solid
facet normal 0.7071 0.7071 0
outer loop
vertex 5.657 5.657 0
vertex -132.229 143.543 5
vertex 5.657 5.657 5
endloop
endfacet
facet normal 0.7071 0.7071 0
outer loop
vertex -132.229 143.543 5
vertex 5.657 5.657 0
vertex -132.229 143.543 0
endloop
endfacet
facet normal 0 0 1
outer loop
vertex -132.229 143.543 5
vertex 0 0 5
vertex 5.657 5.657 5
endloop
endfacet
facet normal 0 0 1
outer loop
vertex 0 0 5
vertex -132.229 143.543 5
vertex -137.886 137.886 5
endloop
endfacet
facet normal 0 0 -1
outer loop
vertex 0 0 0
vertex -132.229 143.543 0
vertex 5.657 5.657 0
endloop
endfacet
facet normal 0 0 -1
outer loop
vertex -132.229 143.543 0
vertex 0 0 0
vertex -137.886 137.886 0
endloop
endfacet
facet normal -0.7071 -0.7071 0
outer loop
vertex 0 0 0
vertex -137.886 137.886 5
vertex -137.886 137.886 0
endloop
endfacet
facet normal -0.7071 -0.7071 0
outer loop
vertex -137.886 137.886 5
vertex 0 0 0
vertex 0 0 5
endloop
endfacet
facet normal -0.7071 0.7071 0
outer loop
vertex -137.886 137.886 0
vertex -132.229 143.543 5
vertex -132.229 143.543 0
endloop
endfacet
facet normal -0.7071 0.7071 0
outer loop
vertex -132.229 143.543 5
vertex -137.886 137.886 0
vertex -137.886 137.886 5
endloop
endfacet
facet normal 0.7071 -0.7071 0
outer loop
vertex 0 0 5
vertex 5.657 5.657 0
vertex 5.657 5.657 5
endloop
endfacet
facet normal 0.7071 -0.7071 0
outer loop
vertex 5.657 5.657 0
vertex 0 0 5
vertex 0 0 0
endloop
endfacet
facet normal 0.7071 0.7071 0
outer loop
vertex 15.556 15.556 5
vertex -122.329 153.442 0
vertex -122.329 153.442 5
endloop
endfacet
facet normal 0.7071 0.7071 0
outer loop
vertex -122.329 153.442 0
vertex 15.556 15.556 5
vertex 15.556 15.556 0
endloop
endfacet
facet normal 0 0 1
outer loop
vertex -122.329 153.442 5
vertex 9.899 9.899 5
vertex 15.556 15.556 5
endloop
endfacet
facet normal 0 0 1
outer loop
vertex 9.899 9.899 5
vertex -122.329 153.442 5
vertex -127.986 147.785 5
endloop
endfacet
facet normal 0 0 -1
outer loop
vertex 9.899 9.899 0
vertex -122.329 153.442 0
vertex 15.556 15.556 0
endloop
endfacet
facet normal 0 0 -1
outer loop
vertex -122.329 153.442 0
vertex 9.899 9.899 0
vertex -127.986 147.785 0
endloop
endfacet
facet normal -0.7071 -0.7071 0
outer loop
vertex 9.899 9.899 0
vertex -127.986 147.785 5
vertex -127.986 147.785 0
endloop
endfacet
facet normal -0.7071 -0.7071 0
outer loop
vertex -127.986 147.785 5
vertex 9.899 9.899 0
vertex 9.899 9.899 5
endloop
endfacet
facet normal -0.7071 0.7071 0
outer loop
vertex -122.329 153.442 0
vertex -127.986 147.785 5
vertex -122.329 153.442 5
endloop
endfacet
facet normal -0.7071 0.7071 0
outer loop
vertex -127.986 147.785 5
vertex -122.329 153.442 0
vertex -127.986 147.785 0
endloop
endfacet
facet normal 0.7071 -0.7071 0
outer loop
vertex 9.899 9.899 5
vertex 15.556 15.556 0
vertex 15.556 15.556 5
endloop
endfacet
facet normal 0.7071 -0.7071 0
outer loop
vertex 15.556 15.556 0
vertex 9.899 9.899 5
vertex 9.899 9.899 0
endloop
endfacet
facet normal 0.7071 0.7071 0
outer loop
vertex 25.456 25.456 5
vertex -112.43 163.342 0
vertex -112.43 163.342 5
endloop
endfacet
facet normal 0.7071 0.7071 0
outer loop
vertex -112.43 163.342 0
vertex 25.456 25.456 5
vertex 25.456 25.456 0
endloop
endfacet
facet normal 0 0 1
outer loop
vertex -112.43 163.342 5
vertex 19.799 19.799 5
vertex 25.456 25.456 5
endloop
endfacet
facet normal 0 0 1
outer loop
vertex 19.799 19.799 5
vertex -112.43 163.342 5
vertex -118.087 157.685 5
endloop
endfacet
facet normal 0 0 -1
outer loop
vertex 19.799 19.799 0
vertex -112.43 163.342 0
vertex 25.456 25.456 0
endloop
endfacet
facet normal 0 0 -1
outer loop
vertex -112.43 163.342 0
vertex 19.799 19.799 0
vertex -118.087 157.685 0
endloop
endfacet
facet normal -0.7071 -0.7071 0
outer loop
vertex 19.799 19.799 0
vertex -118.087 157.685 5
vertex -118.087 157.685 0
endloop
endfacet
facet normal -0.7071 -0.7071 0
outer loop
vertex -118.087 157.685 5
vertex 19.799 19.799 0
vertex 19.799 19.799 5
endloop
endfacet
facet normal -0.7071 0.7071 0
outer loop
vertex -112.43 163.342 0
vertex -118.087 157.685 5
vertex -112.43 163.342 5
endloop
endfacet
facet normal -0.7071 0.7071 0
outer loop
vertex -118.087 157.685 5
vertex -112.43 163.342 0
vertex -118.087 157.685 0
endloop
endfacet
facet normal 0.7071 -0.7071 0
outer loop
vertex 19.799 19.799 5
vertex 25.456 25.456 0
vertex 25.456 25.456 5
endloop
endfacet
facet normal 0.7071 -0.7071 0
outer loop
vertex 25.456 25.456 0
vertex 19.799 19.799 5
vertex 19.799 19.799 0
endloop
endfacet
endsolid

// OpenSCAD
// file: shapes.scad
// Shapes the fit test and the real parts share, so the parts get what the
// test print measured.
include <params.scad>

// Centered on x = 0. The outer face is y = 0 and the pocket opens through it;
// the stop runs from y = pocket to pocket + stop, with the wire slit through
// it. Open at the top.
module slot_void(width) {
    translate([-width / 2, -1, comb_base])
        cube([width, pocket + 1, comb_height - comb_base + 1]);
    translate([-wire_slit / 2, pocket - 1, comb_base])
        cube([wire_slit, stop + 2, comb_height - comb_base + 1]);
}

module label_text(t, size = 3) {
    linear_extrude(label_depth + 0.01)
        text(t, size = size, font = label_font,
             halign = "center", valign = "center");
}

module pin() {
    chamfer = 0.4;
    cylinder(d = stack_pin, h = stack_pin_height - chamfer, $fn = 64);
    translate([0, 0, stack_pin_height - chamfer])
        cylinder(d1 = stack_pin, d2 = stack_pin - 2 * chamfer, h = chamfer, $fn = 64);
}

// gap is a wire's measured gap between housings. Seated in both sockets, the
// rail puts the stops' pocket faces gap - gap_slack apart.
function rail_length(gap) = gap - gap_slack - 2 * stop + 2 * rail_socket_depth;

module rail(gap) {
    cube([rail_width, rail_length(gap), rail_height]);
}
// file: params.scad
// Every part includes this file. All lengths in mm, clearances per side.

// A 40-pin ribbon is 4 runs of 10 colors; a slot stacks 8, room for two kits.
housing = 2.54;
wires_per_slot = 8;
colors = 10;

// Fit test: the narrowest slot held flat, a stub took the 0.15 rail socket,
// the pin the 0.3 stack socket, and 3 mm digits read better than 2.5.
slot_width = 2.7;
rail_clearance = 0.15;
stack_clearance = 0.3;
digit_size = 3;

// Between a new wire's housings: 7 1/4 in measured on a 20 cm, 10 cm a guess.
wire_gap_10 = 84;
wire_gap_20 = 184;
// Bent wires come up short; a new one's housings sit out of their pockets.
gap_slack = 5;

slot_wall = 1.6;
// Clears 24 AWG insulation and stops a housing.
wire_slit = 1.9;
// Housings are 14 long, so male pins stick out past the outer face.
pocket = 12;
stop = 2;
comb_base = 2;
ledge = 7;
socket_wall = 2;
stack_height = wires_per_slot * housing + 0.3;
comb_height = comb_base + stack_height;

rail_width = 8;
rail_height = 5;
rail_socket_depth = 10;

stack_pin = 4;
stack_pin_height = 3;

label_depth = 0.6;
label_font = "Liberation Sans:style=Bold";
// main file
// Three of the six 20 cm rails, so print it twice. Turned 45 degrees because a
// rail is longer than the bed.
include <params.scad>
use <shapes.scad>

rotate([0, 0, 45])
    for (i = [0 : 2])
        translate([i * (rail_width + 6), 0, 0]) rail(wire_gap_20);
